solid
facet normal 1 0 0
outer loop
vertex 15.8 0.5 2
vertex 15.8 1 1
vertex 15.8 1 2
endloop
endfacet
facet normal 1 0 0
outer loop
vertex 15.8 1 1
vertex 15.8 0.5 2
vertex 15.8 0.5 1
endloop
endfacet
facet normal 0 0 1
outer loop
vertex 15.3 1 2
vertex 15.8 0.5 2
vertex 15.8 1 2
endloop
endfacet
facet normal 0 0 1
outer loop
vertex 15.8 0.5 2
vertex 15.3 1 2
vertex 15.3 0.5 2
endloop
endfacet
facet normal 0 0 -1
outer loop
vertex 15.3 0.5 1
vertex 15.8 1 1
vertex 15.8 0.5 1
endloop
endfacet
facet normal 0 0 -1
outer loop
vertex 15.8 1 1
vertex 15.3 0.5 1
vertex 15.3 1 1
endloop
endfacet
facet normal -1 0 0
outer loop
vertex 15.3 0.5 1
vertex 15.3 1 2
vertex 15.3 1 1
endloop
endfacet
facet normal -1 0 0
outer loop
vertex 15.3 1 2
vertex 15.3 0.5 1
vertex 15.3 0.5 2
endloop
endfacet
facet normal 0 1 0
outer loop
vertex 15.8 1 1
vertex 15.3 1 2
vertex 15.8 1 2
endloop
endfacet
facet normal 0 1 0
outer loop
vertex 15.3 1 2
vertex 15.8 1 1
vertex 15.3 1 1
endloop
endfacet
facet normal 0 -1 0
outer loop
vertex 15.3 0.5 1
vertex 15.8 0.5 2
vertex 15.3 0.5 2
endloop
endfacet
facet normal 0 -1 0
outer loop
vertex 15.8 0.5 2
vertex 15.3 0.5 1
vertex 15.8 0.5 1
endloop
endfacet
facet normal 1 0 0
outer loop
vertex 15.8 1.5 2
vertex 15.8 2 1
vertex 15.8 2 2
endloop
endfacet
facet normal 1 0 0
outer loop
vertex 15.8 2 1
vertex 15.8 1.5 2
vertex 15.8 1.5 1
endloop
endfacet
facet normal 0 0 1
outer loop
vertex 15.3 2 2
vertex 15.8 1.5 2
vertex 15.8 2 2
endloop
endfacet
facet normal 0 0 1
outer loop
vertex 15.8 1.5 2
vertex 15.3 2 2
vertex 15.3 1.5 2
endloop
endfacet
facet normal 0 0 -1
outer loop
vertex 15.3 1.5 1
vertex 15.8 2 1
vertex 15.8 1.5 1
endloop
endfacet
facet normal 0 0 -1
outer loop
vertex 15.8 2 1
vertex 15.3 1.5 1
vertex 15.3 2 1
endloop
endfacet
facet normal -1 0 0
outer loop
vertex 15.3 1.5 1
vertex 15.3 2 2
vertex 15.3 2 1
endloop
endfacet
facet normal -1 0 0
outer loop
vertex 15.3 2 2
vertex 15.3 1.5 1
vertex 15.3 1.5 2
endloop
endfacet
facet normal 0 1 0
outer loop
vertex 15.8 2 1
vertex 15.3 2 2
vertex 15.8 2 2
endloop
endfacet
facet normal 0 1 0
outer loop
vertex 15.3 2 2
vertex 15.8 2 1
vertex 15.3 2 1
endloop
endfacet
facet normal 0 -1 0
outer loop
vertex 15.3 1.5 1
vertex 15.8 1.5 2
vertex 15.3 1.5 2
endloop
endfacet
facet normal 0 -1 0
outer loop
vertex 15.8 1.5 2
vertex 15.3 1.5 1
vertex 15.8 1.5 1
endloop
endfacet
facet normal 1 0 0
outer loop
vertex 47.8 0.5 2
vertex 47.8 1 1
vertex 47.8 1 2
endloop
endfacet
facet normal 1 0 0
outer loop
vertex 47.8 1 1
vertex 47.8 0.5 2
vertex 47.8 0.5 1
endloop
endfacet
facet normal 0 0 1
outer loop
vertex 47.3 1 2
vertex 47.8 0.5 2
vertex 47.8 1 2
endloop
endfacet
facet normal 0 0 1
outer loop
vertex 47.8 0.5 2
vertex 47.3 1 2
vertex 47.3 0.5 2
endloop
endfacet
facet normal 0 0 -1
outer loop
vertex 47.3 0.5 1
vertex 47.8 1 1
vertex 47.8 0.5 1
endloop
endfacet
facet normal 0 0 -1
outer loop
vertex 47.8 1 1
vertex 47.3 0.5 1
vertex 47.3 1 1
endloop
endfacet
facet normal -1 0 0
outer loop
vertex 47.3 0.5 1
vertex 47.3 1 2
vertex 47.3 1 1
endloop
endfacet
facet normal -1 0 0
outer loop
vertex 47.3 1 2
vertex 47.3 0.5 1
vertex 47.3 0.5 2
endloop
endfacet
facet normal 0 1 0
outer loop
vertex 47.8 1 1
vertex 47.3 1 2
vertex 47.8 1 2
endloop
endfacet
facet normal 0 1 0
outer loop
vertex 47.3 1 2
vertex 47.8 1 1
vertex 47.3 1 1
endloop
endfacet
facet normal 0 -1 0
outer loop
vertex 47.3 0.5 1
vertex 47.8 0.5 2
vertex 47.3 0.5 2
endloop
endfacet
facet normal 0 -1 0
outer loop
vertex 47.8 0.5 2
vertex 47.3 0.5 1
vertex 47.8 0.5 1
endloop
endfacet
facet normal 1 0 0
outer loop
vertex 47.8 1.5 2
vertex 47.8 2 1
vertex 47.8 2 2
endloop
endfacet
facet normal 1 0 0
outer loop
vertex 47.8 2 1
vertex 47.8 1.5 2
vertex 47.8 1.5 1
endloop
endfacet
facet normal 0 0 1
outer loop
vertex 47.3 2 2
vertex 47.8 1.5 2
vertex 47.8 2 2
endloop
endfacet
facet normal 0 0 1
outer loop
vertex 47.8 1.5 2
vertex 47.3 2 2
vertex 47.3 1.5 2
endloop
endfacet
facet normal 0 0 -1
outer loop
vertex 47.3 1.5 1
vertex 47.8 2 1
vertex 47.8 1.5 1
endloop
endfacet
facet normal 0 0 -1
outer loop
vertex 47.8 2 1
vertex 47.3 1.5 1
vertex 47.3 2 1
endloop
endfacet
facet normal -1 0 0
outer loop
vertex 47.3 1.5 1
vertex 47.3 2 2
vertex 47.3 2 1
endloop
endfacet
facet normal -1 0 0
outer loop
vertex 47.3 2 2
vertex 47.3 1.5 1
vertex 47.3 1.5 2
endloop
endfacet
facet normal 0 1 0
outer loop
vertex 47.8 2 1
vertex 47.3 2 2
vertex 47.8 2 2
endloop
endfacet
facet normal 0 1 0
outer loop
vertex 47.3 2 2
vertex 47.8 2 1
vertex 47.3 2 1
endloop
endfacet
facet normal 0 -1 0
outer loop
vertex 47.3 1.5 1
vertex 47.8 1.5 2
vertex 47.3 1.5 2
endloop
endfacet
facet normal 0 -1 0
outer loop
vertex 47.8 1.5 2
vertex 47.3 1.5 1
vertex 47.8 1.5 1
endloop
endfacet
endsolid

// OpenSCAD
// file: params.scad
// spellchecker:ignore centreline counterbore datasheet elec usbc waveshare
// --- Display ---
// Waveshare 7.5inch e-Paper V2 (800×480). Datasheet:
// https://www.waveshare.com/w/upload/6/60/7.5inch_e-Paper_V2_Specification.pdf
display_w        = 111.2;  // display panel width  (mm) — portrait
display_h        = 170.2;  // display panel height (mm) — portrait
disp_thickness   =   1.25; // display panel thickness (mm) — datasheet 1.18; 1.25 gives 0.07mm extra shelf clearance
screen_area_w    =  97.92; // active screen width  (mm)
screen_area_h    = 163.2;  // active screen height (mm)
display_border_wide  =  9.78; // wide border (long edge, right side; = display_w − display_border_narrow − screen_area_w)
display_border_narrow=  3.5;  // narrow border (long edge, left/top/bottom = 1.2+1.5+0.8mm from datasheet)
display_border_short =  3.5;  // short-edge border (top and bottom)
disp_shift           =  0.6;  // additional downward Y offset on display; creates 1mm stopper lip on upper L-blocks

// --- Cavities (back shell interior) ---
elec_w         =  65;    // Pi Zero width  (mm)
elec_l         =  30;    // Pi Zero length (mm)
elec_depth     =  16;    // Pi Zero + PiSugar stack depth (mm) — 15.7mm actual
hat_w          =  30;    // Waveshare HAT width  (mm) — rotated 90° in case
hat_l          =  66;    // Waveshare HAT length (mm)
hat_depth      =   9.5;  // Waveshare HAT depth  (mm)
bat_w          =  28;    // battery width  (mm) — portrait: 28×59 footprint
bat_l          =  59;    // battery length (mm)
bat_depth      =  12.5;  // battery depth  (mm) — 10.7 body + 1.8 magnet

// --- Primitives first (no dependencies) ---
case_w         = 135;    // width  (mm) — 135mm clears 4mm nut towers with 1.5mm margin right of display
case_h         = 210;    // height (mm) — 2+170+35+2=209 → 210
front_depth    =   2;    // front bezel thickness (mm)
back_depth     =  20;    // back shell depth (mm) — elec_depth 15.7 + 2 wall + 2.3 clearance; unconfirmed
fillet_r       =   2;    // outer-edge fillet radius (mm)
edge_overhang_angle = 55; // chamfer→fillet transition (deg from horizontal); 45=safe, 55=X1C tuned
tol            = 0.2;    // FDM clearance on each mating face (mm)
wall_t         = 2;      // nominal wall thickness (mm)

// --- PiSugar flex-tab buttons (south wall) ---
btn_hinge_w     = 2;    // hinge strip width (mm) — right short edge, in-layer bending; flexing beam between fixed wall (_hinge_x1) and tab
btn_slot_kerf   = 1.0;  // slot kerf width (mm) — bottom horizontal slot (Z-direction gap), 0.7 will fuse to material below
btn_slot_kerf_top = 0.75; // slot kerf width (mm) — top horizontal slot (Z-direction gap)
btn_slot_kerf_x = 0.5;  // side slot kerf width (mm) — vertical free-side slot (X-direction gap); wider to prevent fusion

// --- Button area (front face, lower section below display) ---
btn_area_h     =  35;    // height of button zone at bottom of front face (mm)
btn_rows       =   2;
btn_cols       =   4;
btn_hole_tolerance = 0.2;
btn_hole_diameter = 10; // button hole diameter (mm) — physical cap sized to fit with tol clearance
btn_fillet_r   =   2;    // fillet radius on button hole outer edge (mm)
btn_zone_w     = case_w / btn_cols;   // each button is centred in its zone
btn_row_y1     = btn_area_h / 2 - 10;  // bottom row y centre
btn_row_y2     = btn_area_h / 2 + 4;  // top row y centre (closer to display)

// --- Carrier switch layout (shared with carrier.scad) ---
_sw            =  6;    // switch body footprint (mm)
_margin_y      =  1;    // Y margin beyond outermost switch edges (mm)
_loc_y1        = _sw / 2 + _margin_y;                   // 4mm  — bottom row centre in carrier coords
_loc_y2        = _loc_y1 + (btn_row_y2 - btn_row_y1);  // 18mm — top row centre in carrier coords

// --- Magnet recesses (back plate inner face) ---
magnet_d            = 15;   // diameter (mm) — derived from PiSugar image; tune after measuring
magnet_recess_depth = 1.5;  // depth into back plate; leaves 0.5mm wall

// --- Mating-face rabbet/tongue joint ---
rabbet_w       = 1;      // rabbet width into inner wall face (mm)
rabbet_d       = 1.5;    // rabbet depth from mating face (mm) — 2mm coincided with HDMI outer top

// --- M2 fasteners ---
screw_boss_id  = 2.1;    // screw shank clearance diameter (mm)
screw_head_d   = 4.0;    // screw head diameter (mm) — M2 button head, +clearance for circular-hole droop
screw_head_h   = wall_t; // screw head height (mm) — counterbore cuts through full wall thickness
screw_depth    = 25;     // total clearance hole depth from exterior (mm)
nut_af         = 4;      // hex nut across-flats (mm)
nut_t          = 1.6;    // hex nut thickness (mm)
tower_h        = 17;     // nut tower height from front plate inner face (mm) — 17mm leaves 1mm above back floor
tower_w        = 15;     // nut tower width in Y (mm)
// Y centres of the two screws per side; symmetric around case_h/2, clear of Pi stack (Y<32)
side_screw_y   = [case_h / 2 - case_h * 0.3, case_h / 2 + case_h * 0.3];

// --- USB-C notch ---
usbc_notch_w   =  12;    // notch width  (mm)
usbc_notch_h   =   4;    // notch height (mm)

// --- Derived positions (all dependencies above) ---
// Y=0 at bottom (USB-C / south face); X=0 at left inner wall
_elec_x  = wall_t + 0.3;              // Pi Zero left edge (0.3mm right of inner wall; SD card tip flush with exterior)
_elec_y  = wall_t;                   // Pi Zero bottom edge (USB-C face)
_bat_x   = _elec_x + elec_w - bat_w; // battery right edge aligned with Pi Zero right edge
_bat_y   = wall_t + elec_l;          // battery bottom edge above Pi Zero
// Display: active area centred; wide border on right long edge
_screen_x = (case_w - screen_area_w) / 2;   // active screen X centre in case
_disp_x   = _screen_x - display_border_narrow; // panel left edge (narrow border on left)
_disp_y   = btn_area_h + (case_h - btn_area_h - display_h) / 2;  // panel vertically centred above buttons
// HAT holder pegs: centred between left and middle display column pads;
// HAT (66mm long edge along X, rotated 90°) holes 57.5mm apart, 4.25mm in from each end
_hat_peg_x = (_disp_x + 10 + 15/2 + _disp_x + (display_w - 15)/2 + 15/2) / 2;
_hat_peg_y = _disp_y - disp_shift + (display_h - 15) / 2 + 15 + 27;
// (boss_inset removed — corner bosses replaced by side-entry screw towers)
// main file
// Standalone anti-droop pillar supports for the PiSugar flex-tab hinges
// (south wall, bottom slot). Optional: place these as additional objects on
// the print bed inside the bottom-slot gap to support the tab overhang,
// instead of using slicer-generated supports.
// spellchecker:ignore droop

include <params.scad>

_pillar_w  = 0.5; // anti-droop pillar width (1 nozzle)
_btn_z0    = -btn_slot_kerf / 2;

// Outer/inner skin towers for one hinge (xc = button centre X)
module hinge_print_support_pair(xc) {
    _epx = xc + 3 - btn_slot_kerf_x/2 - _pillar_w + 0.25;
    for (yo = [-(wall_t - 0.5), -0.5])
        translate([_elec_x + _epx, _elec_y + yo, wall_t + _btn_z0 - btn_slot_kerf/2])
            cube([_pillar_w, 0.5, btn_slot_kerf]);
}

module hinge_print_supports() {
    for (xc = [10.5, 42.5])
        hinge_print_support_pair(xc);
}

hinge_print_supports();
